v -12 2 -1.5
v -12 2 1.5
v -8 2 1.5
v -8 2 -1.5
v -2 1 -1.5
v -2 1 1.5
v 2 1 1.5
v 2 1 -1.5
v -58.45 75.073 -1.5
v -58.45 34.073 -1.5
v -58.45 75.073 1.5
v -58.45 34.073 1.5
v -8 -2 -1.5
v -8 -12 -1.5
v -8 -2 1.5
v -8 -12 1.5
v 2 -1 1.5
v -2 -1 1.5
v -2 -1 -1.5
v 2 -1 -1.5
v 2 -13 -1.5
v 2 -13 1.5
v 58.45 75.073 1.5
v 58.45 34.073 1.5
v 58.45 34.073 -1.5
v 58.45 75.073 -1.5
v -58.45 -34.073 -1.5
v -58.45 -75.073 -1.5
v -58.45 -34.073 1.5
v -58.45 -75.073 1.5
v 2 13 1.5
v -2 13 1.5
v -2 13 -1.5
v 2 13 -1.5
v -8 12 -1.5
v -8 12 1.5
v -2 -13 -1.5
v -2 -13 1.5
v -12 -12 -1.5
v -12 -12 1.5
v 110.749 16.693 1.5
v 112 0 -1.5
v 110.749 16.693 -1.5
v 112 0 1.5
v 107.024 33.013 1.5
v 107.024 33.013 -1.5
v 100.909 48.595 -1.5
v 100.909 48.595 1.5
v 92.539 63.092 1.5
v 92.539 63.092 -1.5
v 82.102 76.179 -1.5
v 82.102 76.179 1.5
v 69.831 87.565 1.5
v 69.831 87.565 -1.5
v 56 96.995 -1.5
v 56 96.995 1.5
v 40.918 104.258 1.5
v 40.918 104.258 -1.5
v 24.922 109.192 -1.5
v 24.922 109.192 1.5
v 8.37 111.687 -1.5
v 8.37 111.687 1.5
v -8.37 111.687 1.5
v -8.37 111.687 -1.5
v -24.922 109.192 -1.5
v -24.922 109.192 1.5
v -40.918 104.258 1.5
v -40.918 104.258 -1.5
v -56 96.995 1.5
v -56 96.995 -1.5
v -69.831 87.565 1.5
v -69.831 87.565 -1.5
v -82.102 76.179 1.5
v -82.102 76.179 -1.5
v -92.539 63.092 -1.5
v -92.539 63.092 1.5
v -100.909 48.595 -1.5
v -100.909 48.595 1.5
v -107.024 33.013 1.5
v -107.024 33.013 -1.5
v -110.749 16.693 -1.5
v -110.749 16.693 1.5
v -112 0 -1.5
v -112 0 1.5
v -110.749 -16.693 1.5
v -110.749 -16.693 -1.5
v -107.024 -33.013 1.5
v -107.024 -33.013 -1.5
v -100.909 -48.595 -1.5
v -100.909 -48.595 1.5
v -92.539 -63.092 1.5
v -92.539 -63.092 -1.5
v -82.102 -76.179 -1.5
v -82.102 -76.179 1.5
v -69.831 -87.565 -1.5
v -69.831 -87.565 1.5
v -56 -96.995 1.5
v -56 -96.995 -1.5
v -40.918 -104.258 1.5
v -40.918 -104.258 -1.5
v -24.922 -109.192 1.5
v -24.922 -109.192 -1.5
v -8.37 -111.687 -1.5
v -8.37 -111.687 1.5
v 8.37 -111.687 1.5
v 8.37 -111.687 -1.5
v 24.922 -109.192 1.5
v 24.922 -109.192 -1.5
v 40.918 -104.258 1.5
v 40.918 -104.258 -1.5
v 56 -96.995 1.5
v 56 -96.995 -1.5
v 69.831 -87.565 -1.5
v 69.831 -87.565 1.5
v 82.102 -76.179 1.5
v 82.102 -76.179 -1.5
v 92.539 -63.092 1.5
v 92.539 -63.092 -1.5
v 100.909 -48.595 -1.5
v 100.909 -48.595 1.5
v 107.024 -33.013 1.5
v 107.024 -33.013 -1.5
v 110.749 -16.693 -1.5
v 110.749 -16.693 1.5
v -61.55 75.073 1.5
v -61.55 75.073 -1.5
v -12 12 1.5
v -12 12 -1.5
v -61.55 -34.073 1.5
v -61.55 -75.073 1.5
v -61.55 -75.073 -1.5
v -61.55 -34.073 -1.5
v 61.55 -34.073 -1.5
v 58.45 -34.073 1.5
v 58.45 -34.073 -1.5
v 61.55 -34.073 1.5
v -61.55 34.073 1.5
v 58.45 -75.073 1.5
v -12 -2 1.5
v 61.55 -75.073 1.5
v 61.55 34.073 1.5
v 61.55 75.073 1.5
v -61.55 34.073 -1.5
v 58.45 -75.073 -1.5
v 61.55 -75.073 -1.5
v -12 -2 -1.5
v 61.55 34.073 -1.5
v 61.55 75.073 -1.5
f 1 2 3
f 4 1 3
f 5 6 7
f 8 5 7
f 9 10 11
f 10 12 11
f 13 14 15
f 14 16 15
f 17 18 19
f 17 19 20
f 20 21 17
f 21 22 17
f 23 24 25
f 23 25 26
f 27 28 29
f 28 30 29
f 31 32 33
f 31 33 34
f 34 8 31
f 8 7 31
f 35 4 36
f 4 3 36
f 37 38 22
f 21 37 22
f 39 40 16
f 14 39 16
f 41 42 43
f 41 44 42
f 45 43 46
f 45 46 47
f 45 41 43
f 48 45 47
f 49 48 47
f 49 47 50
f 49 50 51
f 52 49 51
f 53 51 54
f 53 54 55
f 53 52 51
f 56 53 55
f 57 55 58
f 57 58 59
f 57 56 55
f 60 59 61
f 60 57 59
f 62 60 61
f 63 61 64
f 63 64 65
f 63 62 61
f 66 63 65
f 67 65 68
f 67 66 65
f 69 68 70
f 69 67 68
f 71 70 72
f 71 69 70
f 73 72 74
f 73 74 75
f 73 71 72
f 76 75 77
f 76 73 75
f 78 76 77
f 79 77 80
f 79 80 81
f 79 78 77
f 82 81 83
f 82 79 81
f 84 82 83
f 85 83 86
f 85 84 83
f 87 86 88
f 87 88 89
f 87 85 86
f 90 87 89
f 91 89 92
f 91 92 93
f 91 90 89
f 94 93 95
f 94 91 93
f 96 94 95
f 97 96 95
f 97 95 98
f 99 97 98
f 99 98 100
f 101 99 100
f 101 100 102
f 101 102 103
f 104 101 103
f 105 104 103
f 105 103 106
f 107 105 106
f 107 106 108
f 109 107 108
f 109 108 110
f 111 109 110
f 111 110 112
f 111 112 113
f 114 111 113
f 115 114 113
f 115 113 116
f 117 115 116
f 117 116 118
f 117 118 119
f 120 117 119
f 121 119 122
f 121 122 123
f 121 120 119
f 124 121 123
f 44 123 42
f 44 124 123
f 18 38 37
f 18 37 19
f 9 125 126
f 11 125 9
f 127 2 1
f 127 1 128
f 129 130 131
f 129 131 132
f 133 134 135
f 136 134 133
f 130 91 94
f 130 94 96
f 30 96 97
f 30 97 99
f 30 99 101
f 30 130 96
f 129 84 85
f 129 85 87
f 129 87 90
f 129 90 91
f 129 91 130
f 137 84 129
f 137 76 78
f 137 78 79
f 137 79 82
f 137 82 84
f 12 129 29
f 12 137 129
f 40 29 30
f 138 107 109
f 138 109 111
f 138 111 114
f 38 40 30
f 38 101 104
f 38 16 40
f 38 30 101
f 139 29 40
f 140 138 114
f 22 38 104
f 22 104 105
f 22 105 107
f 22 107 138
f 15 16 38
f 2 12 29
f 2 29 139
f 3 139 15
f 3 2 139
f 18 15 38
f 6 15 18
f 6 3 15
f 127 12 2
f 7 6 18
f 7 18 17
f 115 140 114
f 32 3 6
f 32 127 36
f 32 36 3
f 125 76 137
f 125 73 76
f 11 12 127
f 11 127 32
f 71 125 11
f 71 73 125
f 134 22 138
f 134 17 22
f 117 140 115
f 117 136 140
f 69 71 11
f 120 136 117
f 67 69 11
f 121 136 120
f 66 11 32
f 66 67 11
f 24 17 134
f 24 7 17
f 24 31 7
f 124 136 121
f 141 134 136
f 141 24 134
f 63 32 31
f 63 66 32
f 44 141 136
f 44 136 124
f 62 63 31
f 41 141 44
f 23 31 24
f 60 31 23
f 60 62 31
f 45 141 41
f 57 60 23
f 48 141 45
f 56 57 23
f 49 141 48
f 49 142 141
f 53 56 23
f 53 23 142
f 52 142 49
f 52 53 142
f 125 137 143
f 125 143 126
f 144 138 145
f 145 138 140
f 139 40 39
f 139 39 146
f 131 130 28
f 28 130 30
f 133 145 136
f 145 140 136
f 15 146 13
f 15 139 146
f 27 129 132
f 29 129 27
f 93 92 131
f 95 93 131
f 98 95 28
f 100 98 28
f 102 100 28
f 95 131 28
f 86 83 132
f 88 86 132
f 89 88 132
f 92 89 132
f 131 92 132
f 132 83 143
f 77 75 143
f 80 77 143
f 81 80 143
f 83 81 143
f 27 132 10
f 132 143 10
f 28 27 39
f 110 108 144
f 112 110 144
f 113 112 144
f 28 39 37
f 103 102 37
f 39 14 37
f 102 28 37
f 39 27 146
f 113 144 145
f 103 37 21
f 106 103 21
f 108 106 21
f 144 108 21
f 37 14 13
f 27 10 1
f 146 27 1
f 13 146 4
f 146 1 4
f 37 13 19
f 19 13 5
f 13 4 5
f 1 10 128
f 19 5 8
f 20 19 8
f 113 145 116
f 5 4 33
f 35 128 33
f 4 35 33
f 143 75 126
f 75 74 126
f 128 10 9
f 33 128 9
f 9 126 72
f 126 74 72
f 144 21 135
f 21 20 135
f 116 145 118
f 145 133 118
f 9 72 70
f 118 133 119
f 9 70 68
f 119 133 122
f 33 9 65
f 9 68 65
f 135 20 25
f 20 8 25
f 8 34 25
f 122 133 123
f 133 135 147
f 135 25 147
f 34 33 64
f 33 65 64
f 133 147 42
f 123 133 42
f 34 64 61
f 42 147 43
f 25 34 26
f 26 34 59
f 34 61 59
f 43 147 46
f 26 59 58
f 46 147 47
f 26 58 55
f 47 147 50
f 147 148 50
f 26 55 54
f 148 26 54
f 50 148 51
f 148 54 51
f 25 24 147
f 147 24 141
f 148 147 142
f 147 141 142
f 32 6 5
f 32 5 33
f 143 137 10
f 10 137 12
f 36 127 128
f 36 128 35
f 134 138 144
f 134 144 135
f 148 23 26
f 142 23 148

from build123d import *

# Parameters (mm, degrees)
SKETCH1_R           = 112
SKETCH1_W           = 3.1
SKETCH1_H           = 41
SKETCH1_W_2         = 4
SKETCH1_H_2         = 12
SKETCH1_H_3         = 10
BOSS_EXTRUDE1_DEPTH = 1.5


with BuildPart() as part:
    # Sketch1 → Boss-Extrude1 (new body, symmetric)
    with BuildSketch(Plane.XY):
        Circle(SKETCH1_R)
        with Locations((-60, 54.57272334)):
            Rectangle(SKETCH1_W, SKETCH1_H, mode=Mode.SUBTRACT)
        with Locations((-60, -54.57272334)):
            Rectangle(SKETCH1_W, SKETCH1_H, mode=Mode.SUBTRACT)
        with Locations((60, 54.57272334)):
            Rectangle(SKETCH1_W, SKETCH1_H, mode=Mode.SUBTRACT)
        with Locations((60, -54.57272334)):
            Rectangle(SKETCH1_W, SKETCH1_H, mode=Mode.SUBTRACT)
        with Locations((0, 7)):
            Rectangle(SKETCH1_W_2, SKETCH1_H_2, mode=Mode.SUBTRACT)
        with Locations((0, -7)):
            Rectangle(SKETCH1_W_2, SKETCH1_H_2, mode=Mode.SUBTRACT)
        with Locations((-10, 7)):
            Rectangle(SKETCH1_W_2, SKETCH1_H_3, mode=Mode.SUBTRACT)
        with Locations((-10, -7)):
            Rectangle(SKETCH1_W_2, SKETCH1_H_3, mode=Mode.SUBTRACT)
    extrude(amount=BOSS_EXTRUDE1_DEPTH, both=True)


solid = part.part
